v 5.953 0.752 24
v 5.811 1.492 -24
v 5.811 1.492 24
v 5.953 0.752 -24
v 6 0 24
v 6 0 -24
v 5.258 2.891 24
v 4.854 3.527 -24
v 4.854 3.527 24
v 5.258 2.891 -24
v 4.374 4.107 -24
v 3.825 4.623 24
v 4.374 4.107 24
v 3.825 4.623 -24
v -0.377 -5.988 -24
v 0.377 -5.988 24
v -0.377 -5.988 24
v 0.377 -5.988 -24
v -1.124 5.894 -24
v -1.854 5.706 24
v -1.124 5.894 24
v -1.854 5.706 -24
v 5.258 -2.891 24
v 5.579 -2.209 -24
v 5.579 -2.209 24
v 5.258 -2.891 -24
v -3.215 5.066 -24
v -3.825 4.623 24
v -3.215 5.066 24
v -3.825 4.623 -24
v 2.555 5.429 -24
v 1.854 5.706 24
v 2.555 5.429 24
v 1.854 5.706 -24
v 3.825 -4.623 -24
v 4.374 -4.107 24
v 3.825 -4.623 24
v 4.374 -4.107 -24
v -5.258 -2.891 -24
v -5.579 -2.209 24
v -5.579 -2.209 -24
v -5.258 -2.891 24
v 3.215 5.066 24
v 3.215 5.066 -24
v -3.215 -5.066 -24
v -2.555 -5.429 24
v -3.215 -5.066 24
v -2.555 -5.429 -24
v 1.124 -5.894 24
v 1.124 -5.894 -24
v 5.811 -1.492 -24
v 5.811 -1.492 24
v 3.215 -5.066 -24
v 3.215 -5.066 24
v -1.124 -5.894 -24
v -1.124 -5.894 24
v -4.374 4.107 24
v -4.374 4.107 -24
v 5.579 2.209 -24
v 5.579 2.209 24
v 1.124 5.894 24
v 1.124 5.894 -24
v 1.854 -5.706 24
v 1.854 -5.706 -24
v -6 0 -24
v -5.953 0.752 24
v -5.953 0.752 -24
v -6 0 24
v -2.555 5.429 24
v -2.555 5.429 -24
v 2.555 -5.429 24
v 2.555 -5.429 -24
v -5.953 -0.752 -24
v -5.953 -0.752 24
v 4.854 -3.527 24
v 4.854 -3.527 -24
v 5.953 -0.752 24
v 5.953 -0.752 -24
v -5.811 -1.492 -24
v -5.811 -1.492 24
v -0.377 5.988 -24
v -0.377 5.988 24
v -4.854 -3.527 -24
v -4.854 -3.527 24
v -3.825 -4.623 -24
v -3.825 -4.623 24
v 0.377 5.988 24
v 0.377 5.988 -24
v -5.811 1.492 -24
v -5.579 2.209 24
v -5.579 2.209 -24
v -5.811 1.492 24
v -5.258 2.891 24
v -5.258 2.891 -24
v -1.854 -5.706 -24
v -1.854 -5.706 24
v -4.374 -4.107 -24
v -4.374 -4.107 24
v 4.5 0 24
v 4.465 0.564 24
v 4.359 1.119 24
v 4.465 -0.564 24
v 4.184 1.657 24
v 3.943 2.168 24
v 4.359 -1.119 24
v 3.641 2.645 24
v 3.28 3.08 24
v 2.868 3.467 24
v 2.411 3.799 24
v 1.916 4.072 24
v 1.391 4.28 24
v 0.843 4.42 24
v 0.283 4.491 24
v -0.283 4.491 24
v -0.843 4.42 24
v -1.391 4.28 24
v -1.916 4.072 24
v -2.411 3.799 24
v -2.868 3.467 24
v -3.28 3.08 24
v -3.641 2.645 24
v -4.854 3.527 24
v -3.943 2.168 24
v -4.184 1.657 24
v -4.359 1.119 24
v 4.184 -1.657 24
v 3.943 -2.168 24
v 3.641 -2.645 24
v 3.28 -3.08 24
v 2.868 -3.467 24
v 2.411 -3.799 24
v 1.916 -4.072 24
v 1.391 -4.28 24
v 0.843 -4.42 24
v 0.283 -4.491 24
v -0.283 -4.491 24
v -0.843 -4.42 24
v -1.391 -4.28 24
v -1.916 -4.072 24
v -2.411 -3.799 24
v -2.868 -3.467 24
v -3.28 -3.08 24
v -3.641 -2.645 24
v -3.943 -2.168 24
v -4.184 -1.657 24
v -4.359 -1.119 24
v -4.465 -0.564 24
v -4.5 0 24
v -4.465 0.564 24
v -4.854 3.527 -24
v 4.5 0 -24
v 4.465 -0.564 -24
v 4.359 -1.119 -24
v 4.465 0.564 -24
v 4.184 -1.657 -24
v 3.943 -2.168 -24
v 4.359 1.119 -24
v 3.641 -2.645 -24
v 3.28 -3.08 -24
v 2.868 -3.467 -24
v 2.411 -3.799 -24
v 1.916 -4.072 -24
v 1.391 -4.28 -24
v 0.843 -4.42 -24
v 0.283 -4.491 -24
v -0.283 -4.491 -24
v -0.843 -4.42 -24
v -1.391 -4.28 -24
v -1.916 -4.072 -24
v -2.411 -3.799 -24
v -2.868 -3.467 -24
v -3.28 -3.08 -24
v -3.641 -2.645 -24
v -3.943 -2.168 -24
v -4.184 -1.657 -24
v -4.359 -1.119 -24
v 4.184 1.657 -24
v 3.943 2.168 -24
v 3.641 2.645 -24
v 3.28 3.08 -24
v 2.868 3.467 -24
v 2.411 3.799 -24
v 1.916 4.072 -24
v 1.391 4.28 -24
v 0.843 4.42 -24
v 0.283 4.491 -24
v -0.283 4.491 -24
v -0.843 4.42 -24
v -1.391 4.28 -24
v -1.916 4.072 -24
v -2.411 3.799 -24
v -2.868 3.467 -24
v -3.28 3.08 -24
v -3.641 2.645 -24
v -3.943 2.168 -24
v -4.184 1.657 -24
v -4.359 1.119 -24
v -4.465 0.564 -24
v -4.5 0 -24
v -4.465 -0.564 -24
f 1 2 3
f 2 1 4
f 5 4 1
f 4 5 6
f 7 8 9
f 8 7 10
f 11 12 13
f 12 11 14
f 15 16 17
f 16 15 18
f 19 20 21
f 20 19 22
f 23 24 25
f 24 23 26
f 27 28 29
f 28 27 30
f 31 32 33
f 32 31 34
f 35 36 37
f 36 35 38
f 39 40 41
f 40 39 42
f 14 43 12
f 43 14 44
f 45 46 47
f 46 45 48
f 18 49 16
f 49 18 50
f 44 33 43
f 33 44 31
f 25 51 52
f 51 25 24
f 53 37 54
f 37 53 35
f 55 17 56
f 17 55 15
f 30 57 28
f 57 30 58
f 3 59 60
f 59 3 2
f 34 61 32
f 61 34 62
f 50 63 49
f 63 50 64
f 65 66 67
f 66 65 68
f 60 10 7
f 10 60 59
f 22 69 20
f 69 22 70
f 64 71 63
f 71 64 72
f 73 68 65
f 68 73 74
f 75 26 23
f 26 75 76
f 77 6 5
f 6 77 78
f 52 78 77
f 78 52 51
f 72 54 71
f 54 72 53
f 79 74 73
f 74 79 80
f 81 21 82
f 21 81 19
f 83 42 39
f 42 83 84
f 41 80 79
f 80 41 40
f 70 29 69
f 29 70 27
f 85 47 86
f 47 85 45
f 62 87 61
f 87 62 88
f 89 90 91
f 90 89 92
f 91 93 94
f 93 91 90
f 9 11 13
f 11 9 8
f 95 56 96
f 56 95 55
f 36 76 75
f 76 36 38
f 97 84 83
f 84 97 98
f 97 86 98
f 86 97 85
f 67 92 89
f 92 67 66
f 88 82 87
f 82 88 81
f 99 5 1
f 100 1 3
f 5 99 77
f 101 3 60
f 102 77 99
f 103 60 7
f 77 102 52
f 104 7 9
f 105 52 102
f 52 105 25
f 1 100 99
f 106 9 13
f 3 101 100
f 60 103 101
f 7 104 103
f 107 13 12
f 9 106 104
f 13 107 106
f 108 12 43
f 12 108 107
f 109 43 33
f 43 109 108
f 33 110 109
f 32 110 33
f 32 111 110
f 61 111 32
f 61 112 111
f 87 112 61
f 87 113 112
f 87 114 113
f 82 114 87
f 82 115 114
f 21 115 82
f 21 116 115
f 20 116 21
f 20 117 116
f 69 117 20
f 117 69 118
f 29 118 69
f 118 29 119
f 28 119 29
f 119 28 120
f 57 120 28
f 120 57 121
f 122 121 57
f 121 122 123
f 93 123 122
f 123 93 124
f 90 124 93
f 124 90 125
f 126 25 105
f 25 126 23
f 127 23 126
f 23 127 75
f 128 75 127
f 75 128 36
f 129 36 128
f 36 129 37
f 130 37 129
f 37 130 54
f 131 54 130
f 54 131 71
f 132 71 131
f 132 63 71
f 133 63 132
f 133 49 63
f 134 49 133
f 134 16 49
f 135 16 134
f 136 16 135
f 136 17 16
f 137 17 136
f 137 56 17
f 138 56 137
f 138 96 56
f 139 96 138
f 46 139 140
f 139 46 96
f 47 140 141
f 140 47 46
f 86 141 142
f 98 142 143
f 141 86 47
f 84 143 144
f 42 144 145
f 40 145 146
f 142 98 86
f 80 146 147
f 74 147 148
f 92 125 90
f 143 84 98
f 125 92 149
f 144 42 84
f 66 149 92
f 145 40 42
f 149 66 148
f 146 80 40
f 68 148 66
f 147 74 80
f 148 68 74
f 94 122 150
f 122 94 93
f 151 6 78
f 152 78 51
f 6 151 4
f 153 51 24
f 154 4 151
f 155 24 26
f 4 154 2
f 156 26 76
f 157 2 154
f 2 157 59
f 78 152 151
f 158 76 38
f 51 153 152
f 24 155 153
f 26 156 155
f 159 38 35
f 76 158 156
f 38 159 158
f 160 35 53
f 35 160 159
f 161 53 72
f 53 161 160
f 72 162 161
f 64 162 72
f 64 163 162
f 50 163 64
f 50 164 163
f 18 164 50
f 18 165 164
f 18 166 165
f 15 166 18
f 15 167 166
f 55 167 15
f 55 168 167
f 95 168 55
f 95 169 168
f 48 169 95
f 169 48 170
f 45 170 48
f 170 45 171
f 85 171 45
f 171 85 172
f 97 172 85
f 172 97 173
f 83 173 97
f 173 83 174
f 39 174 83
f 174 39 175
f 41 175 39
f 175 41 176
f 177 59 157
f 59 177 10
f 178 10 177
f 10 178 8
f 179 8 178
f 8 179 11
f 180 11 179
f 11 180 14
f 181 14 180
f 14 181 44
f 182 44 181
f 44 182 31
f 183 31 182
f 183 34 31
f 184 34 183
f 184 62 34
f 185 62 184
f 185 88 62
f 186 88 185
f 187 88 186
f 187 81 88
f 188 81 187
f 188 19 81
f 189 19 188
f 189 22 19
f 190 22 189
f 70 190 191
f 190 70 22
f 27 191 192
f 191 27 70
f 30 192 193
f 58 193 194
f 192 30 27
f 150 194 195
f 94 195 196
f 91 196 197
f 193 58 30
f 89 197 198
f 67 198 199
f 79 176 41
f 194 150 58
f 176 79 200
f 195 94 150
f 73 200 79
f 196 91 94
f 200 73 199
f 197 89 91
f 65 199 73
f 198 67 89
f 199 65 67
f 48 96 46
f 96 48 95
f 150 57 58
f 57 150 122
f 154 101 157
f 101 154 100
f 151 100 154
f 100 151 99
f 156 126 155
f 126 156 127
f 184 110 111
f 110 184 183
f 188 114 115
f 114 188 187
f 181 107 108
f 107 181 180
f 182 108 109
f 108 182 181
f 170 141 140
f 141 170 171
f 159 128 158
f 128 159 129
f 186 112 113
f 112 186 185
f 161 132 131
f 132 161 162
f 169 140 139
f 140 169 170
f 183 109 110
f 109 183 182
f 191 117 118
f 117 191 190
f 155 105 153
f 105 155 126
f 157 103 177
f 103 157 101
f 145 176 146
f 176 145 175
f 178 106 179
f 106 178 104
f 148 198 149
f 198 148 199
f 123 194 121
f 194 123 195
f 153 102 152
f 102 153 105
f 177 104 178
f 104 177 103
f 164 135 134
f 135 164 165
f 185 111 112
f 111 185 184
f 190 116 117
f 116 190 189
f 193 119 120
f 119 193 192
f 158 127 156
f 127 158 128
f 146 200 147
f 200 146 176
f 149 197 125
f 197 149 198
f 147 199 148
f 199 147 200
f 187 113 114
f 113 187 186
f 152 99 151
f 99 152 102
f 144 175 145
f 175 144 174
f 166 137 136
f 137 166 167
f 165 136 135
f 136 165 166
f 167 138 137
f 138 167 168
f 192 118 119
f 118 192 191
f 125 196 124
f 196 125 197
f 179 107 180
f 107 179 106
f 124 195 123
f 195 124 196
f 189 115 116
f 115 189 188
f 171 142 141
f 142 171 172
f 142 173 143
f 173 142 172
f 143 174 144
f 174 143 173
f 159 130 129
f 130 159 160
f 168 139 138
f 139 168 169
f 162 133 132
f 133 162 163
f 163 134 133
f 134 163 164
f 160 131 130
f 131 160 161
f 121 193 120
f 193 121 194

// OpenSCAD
$fn = 50;


difference() {
	union() {
		translate(v = [0, 0, -24.0000000000]) {
			cylinder(h = 48, r = 6.0000000000);
		}
	}
	union() {
		translate(v = [0, 0, -100.0000000000]) {
			cylinder(h = 200, r = 4.5000000000);
		}
	}
}
